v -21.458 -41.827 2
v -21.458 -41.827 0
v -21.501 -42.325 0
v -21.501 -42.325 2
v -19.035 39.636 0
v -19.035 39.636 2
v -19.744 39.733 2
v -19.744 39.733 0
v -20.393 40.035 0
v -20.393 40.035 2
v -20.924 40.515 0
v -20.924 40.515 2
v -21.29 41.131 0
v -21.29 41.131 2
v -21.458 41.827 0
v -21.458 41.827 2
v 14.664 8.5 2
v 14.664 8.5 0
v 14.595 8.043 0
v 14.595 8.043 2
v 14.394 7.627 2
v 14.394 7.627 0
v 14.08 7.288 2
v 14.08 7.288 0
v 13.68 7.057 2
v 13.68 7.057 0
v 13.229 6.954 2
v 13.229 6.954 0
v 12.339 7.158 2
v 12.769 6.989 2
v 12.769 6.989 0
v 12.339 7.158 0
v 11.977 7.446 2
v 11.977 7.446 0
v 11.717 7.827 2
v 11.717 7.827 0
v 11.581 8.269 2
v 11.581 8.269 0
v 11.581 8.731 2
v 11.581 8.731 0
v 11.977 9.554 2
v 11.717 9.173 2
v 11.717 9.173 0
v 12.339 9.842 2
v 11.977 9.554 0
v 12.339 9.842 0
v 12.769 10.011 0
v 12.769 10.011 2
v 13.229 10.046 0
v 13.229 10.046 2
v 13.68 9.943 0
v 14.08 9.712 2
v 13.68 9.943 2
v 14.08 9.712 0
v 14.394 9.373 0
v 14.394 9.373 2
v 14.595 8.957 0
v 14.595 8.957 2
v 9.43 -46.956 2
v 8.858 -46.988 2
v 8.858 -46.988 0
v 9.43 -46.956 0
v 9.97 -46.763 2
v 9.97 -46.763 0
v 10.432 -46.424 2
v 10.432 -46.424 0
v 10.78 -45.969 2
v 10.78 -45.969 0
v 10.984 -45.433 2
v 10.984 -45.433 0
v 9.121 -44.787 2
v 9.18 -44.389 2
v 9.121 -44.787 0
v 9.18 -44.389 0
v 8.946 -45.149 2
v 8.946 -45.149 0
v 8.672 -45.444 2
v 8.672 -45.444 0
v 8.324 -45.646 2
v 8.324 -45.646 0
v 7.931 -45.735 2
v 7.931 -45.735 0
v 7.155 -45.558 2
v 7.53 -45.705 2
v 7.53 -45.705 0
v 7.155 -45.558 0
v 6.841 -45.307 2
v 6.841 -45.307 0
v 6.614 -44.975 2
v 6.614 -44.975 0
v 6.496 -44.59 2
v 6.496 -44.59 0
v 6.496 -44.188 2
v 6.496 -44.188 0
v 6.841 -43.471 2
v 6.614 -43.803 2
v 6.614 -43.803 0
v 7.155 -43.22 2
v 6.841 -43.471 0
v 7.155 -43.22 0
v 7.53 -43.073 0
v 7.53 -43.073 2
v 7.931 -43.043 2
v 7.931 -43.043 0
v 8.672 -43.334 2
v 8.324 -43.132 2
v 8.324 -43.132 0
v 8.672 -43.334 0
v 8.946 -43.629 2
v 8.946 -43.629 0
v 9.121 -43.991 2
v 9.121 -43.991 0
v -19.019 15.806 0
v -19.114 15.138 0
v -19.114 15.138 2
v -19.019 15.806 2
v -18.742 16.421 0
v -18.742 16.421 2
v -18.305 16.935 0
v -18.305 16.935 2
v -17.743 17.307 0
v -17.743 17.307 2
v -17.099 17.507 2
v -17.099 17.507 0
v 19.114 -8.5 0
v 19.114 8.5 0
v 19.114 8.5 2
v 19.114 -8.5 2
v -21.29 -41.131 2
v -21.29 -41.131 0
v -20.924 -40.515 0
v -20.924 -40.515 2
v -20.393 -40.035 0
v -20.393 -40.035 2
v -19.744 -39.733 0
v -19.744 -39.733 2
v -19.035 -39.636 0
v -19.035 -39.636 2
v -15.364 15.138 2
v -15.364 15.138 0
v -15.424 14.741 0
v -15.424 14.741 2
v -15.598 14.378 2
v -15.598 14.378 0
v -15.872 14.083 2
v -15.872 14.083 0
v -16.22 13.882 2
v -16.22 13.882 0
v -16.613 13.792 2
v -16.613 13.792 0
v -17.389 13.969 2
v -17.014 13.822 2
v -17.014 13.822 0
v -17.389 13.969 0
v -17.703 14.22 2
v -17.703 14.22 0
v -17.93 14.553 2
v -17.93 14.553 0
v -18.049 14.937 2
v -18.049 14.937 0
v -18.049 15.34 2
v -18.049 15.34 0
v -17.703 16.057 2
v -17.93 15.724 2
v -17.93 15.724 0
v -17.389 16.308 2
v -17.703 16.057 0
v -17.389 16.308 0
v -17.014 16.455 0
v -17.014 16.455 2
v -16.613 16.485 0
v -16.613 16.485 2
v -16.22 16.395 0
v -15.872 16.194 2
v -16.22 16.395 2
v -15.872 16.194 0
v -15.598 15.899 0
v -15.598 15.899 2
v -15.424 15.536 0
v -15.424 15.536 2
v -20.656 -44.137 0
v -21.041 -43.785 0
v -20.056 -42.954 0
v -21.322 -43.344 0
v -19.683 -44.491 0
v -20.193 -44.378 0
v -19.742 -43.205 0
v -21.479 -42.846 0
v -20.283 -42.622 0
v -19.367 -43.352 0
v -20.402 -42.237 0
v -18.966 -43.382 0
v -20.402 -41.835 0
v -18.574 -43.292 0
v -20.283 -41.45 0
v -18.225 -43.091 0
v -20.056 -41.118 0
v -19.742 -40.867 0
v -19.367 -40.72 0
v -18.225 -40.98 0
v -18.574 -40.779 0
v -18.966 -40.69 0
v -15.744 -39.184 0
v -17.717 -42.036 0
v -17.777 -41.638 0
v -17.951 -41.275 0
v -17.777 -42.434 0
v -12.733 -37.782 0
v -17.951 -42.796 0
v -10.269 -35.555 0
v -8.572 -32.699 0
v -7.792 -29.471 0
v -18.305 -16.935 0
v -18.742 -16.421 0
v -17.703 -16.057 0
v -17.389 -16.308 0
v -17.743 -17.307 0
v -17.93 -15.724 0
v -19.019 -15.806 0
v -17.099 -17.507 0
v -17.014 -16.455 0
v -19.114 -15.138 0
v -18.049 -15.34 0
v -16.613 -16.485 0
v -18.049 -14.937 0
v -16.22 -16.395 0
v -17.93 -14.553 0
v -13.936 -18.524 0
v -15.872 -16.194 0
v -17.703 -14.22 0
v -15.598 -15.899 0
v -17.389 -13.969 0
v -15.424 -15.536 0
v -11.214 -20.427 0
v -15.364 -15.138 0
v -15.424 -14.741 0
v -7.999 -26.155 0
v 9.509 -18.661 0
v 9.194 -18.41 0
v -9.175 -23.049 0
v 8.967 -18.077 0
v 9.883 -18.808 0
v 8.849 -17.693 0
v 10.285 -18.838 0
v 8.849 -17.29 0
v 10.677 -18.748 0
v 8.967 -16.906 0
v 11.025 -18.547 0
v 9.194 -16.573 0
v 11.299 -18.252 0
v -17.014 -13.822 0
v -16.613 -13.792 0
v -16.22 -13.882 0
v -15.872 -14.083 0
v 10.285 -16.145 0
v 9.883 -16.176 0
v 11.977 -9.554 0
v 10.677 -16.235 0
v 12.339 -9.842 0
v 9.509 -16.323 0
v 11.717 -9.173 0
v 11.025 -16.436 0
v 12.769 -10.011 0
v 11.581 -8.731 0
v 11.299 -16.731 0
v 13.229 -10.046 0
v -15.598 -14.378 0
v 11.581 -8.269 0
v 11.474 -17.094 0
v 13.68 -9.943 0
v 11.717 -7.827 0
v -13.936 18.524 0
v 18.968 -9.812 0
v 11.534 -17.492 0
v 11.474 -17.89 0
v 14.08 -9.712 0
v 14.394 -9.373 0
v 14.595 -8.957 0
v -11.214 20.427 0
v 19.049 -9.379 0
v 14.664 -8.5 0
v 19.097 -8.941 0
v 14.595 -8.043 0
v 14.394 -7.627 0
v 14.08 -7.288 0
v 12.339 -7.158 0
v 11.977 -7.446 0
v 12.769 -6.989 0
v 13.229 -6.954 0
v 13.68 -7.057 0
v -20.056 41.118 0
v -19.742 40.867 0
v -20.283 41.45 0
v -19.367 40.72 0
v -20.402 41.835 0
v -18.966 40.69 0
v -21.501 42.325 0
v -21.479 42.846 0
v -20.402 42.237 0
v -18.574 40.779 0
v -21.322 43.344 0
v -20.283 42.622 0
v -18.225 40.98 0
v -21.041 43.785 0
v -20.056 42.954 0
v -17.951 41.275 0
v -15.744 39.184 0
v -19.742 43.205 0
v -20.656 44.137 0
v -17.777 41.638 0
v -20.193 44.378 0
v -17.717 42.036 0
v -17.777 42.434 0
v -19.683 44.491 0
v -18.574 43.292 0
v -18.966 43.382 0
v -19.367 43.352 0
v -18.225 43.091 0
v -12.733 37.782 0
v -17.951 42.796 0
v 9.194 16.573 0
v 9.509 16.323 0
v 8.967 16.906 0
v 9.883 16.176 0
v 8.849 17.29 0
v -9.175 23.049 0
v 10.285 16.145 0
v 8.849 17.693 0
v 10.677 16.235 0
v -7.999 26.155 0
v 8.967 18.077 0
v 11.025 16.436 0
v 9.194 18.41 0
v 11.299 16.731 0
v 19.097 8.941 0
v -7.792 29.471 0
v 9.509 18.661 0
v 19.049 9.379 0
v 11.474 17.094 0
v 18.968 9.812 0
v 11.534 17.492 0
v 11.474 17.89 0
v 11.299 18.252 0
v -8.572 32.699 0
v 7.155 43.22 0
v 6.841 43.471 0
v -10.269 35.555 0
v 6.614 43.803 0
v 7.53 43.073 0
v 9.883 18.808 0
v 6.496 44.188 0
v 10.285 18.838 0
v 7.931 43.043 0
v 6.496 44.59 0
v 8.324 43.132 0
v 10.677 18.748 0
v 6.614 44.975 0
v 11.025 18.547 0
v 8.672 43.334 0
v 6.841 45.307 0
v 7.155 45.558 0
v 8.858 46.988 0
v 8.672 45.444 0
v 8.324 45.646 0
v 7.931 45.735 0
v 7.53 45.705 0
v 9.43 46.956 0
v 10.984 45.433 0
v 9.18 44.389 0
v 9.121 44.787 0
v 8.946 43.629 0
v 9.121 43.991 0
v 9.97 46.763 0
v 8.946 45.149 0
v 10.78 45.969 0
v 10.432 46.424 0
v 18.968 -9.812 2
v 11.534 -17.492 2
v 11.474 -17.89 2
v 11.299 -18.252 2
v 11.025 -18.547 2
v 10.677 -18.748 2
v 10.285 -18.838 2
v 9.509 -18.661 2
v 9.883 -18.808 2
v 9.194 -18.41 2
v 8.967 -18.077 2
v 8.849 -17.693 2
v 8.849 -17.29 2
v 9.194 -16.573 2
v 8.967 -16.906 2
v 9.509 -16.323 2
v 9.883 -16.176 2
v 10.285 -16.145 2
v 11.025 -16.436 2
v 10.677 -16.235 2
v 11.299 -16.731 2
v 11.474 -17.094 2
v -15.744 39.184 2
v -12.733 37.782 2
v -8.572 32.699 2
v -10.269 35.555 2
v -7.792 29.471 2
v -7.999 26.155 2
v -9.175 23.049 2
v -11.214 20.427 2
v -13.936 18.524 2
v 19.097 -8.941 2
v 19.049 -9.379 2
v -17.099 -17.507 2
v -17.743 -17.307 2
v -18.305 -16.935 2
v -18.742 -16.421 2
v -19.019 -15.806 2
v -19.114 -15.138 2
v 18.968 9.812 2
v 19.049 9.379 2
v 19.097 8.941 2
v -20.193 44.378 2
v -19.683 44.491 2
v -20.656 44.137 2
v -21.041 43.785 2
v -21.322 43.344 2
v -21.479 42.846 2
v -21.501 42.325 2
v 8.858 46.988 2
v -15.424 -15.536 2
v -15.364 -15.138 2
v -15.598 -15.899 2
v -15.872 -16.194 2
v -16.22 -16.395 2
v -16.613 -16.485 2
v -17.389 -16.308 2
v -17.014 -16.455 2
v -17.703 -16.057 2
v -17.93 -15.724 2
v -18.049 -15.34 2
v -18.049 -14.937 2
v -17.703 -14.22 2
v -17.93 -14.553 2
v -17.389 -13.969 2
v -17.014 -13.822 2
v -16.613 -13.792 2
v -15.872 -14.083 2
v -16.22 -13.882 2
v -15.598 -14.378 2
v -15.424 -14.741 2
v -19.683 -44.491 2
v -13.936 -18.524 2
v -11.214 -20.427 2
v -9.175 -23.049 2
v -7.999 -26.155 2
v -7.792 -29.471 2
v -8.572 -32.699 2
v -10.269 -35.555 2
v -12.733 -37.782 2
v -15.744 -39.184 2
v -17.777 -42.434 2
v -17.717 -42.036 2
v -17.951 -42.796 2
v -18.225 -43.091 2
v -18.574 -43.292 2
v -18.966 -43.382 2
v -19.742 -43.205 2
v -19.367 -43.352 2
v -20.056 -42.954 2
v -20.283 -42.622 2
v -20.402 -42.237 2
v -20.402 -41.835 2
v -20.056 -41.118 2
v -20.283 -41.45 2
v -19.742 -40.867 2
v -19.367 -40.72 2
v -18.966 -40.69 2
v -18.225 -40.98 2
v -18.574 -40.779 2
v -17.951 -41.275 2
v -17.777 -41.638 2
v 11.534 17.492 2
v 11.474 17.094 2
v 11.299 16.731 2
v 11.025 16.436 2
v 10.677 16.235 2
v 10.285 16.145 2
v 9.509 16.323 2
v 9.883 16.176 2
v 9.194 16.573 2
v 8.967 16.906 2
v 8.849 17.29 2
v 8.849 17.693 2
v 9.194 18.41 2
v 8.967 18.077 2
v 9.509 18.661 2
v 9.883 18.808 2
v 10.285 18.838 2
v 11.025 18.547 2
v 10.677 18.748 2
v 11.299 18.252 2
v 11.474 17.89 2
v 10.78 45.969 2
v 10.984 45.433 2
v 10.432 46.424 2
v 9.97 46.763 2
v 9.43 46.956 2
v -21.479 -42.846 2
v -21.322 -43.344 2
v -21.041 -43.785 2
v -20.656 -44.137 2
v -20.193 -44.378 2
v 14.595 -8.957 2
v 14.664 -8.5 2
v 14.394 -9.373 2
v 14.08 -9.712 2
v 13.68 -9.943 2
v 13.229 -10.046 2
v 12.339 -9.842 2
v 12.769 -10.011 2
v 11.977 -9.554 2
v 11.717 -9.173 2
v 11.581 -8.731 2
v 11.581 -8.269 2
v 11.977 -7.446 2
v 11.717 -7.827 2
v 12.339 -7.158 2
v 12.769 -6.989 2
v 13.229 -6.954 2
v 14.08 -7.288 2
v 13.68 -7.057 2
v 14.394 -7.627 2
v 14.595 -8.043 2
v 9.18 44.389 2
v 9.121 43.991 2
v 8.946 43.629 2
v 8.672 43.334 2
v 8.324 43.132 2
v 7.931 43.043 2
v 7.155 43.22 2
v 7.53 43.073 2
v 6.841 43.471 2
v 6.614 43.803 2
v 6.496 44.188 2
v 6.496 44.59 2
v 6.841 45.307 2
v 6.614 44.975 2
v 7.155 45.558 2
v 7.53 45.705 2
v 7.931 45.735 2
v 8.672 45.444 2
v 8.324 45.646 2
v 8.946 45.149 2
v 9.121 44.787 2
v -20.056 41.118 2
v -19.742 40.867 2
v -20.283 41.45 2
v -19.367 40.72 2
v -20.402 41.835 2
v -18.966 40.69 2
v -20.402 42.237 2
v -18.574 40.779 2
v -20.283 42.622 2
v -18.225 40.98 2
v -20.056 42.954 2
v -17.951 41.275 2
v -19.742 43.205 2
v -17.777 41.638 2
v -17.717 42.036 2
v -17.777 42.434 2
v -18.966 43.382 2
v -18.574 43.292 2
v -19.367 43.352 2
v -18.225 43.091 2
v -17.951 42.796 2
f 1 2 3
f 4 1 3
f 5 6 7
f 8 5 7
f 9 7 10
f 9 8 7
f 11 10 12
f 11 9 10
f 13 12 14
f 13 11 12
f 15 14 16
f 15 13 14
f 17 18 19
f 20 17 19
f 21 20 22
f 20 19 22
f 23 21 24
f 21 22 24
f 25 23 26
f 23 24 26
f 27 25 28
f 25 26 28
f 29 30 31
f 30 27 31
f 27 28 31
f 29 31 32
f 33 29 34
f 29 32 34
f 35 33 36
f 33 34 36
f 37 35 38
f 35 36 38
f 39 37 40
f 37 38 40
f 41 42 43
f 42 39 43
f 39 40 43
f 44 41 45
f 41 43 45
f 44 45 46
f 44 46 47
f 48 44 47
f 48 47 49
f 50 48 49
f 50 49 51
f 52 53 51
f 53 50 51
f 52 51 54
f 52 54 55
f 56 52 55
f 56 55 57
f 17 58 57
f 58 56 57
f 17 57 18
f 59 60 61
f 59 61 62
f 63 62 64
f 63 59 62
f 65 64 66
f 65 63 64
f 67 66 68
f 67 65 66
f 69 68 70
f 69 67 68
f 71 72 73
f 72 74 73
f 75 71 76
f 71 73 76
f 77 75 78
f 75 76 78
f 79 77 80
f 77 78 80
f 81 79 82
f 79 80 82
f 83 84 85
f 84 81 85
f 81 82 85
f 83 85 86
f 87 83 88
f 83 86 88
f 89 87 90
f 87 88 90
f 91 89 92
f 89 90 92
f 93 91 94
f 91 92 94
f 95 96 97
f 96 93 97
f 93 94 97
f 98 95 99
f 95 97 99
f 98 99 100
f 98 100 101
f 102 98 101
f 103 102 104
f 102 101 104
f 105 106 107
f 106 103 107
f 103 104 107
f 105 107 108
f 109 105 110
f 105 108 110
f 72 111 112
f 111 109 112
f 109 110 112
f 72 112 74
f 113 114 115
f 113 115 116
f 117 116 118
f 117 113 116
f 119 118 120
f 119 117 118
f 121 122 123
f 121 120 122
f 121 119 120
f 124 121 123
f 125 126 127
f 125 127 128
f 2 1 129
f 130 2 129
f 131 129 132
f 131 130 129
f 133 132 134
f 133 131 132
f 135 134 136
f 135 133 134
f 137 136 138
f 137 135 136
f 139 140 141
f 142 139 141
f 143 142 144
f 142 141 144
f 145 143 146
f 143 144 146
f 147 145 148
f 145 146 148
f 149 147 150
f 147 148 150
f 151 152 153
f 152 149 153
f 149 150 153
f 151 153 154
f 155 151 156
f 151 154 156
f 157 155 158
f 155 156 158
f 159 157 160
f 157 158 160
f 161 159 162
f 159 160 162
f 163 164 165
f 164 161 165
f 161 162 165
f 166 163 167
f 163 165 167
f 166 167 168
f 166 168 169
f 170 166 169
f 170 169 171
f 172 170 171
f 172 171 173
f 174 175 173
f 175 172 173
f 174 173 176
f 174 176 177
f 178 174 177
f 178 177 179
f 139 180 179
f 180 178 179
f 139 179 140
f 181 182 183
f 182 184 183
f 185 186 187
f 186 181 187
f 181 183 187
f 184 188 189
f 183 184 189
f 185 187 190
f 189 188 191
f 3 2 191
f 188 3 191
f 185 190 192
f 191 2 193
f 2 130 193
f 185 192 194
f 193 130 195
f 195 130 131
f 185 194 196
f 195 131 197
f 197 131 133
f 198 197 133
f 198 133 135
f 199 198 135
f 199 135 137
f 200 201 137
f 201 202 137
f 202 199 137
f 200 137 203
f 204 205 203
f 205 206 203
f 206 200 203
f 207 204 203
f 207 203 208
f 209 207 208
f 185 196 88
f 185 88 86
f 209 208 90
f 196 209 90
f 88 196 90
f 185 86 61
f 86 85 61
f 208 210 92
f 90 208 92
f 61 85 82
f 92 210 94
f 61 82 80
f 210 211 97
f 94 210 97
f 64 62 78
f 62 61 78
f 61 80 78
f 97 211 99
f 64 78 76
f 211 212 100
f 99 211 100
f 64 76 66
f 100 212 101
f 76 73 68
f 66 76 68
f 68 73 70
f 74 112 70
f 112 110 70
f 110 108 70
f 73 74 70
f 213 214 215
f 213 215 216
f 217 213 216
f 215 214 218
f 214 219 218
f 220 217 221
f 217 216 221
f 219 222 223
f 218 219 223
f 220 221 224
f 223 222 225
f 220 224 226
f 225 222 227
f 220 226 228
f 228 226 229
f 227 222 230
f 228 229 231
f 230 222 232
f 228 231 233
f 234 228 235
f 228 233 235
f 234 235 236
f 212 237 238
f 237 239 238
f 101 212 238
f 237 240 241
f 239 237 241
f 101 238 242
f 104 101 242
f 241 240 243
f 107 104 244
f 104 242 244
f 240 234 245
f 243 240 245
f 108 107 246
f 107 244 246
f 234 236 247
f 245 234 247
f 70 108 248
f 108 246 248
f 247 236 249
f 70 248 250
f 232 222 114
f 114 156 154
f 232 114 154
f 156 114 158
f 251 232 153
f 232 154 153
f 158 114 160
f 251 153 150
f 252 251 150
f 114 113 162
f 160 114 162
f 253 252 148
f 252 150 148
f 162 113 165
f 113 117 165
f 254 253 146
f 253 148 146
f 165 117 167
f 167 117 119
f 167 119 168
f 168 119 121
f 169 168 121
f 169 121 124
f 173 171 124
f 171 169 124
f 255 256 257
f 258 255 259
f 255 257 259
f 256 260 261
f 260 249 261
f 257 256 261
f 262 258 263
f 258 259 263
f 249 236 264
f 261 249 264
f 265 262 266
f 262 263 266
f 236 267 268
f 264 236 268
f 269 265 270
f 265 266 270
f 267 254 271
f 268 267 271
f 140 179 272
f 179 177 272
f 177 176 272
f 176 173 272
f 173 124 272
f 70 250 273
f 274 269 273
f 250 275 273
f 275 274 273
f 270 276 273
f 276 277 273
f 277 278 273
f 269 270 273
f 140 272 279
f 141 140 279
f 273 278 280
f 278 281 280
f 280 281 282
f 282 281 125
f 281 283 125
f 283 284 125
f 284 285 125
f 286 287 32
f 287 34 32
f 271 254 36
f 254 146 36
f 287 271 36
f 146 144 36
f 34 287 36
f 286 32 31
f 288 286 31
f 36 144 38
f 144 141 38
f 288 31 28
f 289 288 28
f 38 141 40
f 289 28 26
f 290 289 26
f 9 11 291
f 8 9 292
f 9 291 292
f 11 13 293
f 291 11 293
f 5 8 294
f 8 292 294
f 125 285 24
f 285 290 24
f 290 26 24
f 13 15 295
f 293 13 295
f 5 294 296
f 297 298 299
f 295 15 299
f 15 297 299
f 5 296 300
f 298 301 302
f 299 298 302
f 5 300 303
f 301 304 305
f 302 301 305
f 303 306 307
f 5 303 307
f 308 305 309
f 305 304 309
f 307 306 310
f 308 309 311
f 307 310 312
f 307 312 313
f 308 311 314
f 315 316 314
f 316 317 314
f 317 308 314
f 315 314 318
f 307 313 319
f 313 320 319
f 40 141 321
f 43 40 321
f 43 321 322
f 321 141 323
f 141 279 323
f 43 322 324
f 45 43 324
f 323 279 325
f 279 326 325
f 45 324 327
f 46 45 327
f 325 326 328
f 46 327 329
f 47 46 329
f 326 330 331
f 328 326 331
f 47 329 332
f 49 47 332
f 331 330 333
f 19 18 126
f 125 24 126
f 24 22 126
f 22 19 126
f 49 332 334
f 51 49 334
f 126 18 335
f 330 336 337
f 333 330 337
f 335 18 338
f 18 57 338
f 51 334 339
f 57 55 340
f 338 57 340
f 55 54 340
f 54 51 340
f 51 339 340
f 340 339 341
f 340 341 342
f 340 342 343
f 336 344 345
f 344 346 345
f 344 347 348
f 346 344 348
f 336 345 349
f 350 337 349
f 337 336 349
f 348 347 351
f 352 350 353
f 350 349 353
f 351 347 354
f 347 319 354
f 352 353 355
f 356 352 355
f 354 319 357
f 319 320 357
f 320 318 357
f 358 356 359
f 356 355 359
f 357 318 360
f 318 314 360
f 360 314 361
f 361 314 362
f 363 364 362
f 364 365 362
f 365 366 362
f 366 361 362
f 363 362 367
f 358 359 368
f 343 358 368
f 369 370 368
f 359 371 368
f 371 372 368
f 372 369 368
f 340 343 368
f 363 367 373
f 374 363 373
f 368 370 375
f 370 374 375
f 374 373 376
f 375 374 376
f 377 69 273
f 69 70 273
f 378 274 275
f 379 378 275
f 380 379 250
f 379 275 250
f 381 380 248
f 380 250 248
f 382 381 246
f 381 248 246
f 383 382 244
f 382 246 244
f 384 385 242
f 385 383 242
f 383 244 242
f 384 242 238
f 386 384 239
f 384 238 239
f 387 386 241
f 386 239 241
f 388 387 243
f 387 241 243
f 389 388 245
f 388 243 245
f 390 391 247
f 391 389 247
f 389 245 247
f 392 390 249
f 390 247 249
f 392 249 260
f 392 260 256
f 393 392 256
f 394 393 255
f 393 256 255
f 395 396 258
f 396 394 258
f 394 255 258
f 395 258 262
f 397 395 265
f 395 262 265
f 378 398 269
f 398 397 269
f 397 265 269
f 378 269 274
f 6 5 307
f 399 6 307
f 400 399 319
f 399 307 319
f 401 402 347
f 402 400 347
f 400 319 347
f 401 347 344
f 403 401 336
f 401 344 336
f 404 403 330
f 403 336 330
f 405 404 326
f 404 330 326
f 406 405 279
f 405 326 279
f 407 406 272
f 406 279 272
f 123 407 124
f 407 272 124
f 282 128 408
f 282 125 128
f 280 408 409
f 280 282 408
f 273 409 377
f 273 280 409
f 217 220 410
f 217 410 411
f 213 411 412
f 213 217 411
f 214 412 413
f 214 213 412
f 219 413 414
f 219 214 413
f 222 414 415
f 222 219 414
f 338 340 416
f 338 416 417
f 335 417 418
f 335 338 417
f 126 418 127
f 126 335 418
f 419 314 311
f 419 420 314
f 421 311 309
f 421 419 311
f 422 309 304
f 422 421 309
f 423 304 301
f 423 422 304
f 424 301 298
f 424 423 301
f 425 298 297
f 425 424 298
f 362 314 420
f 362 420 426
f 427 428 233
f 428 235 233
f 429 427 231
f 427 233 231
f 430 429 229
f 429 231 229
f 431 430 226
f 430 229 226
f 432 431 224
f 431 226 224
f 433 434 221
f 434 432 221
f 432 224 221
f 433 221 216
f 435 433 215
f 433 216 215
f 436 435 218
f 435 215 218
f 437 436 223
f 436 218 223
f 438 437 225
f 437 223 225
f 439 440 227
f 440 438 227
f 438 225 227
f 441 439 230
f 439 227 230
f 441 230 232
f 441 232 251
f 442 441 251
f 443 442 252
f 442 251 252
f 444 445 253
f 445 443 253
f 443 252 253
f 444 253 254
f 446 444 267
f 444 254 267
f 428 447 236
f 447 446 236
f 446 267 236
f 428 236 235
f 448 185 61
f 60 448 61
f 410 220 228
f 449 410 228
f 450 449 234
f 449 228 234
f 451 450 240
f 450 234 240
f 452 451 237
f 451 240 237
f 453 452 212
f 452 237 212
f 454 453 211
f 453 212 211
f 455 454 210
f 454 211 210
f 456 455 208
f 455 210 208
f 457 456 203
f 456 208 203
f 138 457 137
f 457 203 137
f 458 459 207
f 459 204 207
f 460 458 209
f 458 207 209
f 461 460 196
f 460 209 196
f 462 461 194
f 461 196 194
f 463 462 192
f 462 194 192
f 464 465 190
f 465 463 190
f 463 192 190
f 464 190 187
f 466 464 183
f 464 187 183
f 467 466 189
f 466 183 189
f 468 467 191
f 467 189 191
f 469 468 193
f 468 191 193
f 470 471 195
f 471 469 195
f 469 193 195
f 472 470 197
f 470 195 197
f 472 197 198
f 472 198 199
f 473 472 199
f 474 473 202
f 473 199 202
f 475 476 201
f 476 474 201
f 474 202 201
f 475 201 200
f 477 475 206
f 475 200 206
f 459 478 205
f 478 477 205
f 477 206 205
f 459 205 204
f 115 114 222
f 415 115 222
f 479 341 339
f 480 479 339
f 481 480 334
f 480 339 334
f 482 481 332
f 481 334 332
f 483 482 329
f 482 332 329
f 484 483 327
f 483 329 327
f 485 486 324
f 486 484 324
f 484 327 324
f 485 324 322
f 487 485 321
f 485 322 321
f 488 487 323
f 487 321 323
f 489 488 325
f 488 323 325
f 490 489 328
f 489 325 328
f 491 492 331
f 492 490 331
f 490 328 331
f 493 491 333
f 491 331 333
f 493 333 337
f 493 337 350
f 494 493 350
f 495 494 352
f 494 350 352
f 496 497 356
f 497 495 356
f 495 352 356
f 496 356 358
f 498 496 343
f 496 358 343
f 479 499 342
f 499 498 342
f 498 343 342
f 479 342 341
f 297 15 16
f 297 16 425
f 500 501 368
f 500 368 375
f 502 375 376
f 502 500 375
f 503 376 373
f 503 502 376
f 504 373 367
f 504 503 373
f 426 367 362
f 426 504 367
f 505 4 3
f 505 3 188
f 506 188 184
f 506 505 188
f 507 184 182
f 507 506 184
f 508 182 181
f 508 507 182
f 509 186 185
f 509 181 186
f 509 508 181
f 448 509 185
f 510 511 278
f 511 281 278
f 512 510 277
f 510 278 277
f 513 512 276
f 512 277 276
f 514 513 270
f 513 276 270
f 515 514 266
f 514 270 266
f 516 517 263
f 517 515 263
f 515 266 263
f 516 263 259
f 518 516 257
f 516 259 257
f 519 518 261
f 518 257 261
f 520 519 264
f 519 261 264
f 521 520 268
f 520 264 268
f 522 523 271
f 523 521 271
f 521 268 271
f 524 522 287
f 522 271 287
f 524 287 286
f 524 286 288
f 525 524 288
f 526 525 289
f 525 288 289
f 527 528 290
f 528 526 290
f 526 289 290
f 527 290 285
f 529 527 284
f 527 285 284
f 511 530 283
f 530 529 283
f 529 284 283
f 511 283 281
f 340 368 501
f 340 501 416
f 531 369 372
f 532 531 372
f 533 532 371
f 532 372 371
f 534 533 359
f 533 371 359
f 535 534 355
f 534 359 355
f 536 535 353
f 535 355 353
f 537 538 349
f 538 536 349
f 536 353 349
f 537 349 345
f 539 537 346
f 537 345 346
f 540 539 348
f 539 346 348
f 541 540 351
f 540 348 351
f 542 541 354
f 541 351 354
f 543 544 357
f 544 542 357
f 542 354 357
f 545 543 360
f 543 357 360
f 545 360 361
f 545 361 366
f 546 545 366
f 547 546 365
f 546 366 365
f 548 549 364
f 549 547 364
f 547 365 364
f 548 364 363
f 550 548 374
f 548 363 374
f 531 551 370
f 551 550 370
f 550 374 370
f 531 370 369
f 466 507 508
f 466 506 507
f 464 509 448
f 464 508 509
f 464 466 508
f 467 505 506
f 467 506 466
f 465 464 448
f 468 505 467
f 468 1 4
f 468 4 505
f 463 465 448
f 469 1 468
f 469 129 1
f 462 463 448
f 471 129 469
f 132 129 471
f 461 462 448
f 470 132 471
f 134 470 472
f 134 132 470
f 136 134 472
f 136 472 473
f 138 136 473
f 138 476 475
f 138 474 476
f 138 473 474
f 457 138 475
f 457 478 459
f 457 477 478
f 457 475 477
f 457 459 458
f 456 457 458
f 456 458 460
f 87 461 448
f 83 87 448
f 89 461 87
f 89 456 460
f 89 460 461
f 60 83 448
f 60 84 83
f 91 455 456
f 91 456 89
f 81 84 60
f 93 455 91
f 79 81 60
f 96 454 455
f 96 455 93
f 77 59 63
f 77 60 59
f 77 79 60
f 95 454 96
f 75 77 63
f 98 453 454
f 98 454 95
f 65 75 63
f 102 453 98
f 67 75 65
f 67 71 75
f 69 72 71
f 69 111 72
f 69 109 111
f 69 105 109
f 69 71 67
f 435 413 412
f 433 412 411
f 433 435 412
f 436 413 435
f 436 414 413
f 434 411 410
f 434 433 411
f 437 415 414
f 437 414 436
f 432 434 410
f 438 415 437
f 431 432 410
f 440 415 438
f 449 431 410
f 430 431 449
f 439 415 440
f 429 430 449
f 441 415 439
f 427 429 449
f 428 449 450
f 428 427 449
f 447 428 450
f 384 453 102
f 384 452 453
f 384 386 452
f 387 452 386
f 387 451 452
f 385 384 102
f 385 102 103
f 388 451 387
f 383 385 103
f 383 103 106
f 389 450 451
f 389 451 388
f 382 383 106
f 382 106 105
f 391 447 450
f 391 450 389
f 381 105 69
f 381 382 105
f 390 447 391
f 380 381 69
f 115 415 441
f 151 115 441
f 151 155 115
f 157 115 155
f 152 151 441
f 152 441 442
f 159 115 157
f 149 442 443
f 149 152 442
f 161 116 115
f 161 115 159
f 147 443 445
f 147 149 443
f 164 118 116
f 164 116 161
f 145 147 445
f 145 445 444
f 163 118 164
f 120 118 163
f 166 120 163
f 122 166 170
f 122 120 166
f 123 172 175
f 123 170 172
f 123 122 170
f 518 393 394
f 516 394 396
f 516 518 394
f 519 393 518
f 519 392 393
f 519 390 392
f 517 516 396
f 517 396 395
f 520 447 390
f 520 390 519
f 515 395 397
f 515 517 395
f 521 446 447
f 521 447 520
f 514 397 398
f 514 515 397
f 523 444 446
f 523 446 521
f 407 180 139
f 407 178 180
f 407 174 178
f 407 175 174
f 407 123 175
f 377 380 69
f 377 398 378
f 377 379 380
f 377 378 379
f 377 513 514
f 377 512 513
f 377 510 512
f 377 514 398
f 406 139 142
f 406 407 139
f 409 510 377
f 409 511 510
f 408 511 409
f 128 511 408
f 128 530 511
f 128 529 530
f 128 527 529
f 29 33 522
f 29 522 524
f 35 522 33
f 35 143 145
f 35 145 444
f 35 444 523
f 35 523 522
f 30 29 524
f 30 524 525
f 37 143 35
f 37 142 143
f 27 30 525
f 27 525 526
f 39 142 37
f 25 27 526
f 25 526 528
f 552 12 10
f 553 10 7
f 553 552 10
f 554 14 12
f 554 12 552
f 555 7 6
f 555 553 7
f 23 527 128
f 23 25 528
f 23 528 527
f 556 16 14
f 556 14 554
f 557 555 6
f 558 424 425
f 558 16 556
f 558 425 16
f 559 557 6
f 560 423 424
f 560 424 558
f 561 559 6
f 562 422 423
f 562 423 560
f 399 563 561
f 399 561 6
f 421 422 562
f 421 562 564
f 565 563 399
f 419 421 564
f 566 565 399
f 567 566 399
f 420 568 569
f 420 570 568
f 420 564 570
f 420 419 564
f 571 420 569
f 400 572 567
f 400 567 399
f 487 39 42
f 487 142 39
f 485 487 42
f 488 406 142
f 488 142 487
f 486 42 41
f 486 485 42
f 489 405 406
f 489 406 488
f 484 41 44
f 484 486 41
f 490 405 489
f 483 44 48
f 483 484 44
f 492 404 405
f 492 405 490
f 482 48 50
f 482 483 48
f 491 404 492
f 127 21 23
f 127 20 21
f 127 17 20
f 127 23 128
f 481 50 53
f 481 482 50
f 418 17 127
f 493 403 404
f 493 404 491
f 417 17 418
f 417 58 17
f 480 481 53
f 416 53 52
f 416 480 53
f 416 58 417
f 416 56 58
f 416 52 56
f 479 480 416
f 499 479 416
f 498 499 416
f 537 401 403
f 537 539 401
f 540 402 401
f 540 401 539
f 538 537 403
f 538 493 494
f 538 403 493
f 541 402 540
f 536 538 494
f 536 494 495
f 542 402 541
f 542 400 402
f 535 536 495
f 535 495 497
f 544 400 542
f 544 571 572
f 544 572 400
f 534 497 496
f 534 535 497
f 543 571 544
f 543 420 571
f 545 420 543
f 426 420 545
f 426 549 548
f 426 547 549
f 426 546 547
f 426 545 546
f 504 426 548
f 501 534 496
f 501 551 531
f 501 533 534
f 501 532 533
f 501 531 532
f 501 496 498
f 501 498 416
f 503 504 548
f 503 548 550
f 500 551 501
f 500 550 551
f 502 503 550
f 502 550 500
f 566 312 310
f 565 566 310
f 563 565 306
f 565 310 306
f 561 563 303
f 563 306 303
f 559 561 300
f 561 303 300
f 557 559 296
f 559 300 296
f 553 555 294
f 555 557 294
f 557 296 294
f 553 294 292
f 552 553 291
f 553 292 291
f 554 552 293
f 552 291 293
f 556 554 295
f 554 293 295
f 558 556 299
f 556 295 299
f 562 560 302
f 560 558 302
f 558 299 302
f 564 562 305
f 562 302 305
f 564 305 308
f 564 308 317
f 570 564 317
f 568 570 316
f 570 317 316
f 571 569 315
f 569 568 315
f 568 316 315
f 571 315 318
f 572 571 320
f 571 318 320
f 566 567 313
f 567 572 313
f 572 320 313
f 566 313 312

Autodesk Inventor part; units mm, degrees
ref_plane "YZ Plane" through (0, 0, 0) normal (1, 0, 0) x (0, 1, 0)
ref_plane "XZ Plane" through (0, 0, 0) normal (0, 1, 0) x (-1, 0, 0)
ref_plane "XY Plane" through (0, 0, 0) normal (0, 0, 1) x (1, 0, 0)
sketch "スケッチ1" plane through (0, 0, 0) normal (0, 0, 1) x (1, 0, 0)
  line L0 (-32.2352, 43.3932) -> (10.6011, 47.1409) construction
  line L1 (10.6011, 47.1409) -> (13.3901, 15.2627) construction
  line L2 (13.3901, 15.2627) -> (-29.4462, 11.515) construction
  line L3 (-29.4462, 11.515) -> (-32.2352, 43.3932) construction
  line L4 (-32.2352, 43.3932) -> (13.3901, 15.2627) construction
  line L5 (10.6011, 47.1409) -> (-29.4462, 11.515) construction
  line L6 (-30.8407, 27.4541) -> (11.9956, 31.2018) construction
  line L7 (7.8305, 44.389) -> (-19.0668, 42.0358) construction
  line L8 (-19.0668, 42.0358) -> (-16.7136, 15.1385) construction
  line L9 (-16.7136, 15.1385) -> (10.1837, 17.4917) construction
  line L10 (10.1837, 17.4917) -> (7.8305, 44.389) construction
  line L11 (7.8305, 44.389) -> (-16.7136, 15.1385) construction
  line L12 (-19.0668, 42.0358) -> (10.1837, 17.4917) construction
  circle A0 centre (-18.8864, 28.5) radius 10.5 construction
  circle A1 centre (-19.0668, 42.0358) radius 1.35
  line L13 (-5.6182, 43.2124) -> (-3.265, 16.3151) construction
  circle A2 centre (7.8305, 44.389) radius 1.35
  circle A3 centre (-16.7136, 15.1385) radius 1.35
  circle A4 centre (10.1837, 17.4917) radius 1.35
  arc A5 (-21.4577, 41.8266) -> (-19.0348, 39.636) centre (-19.0668, 42.0358) ccw
  arc A6 (-17.0988, 17.5074) -> (-19.0348, 39.636) centre (-18.8864, 28.5) ccw
  arc A7 (-17.0988, 17.5074) -> (-19.1136, 15.1385) centre (-16.7136, 15.1385) ccw
  line L14 (-21.4577, 41.8266) -> (-21.6756, 44.3171)
  circle A8 centre (13.1136, 8.5) radius 1.55
  circle A9 centre (13.1136, 8.5) radius 6 construction
  circle A10 centre (13.1136, 8.5) radius 4.6 construction
  line L15 (19.1136, 8.5) -> (19.1136, -8.5)
  line L16 (-19.1136, 15.1385) -> (-19.1136, -15.1385)
  line L17 (-19.1136, 0) -> (19.1136, 0) construction
  line L18 (-21.6756, 44.3171) -> (10.6011, 47.1409)
  line L19 (10.6011, 47.1409) -> (18.9683, 9.8123)
  arc A11 (19.1136, 8.5) -> (18.9683, 9.8123) centre (13.1136, 8.5) ccw
  circle A12 centre (-18.8864, -28.5) radius 10.5 construction
  circle A13 centre (-19.0668, -42.0358) radius 1.35
  circle A14 centre (7.8305, -44.389) radius 1.35
  circle A15 centre (-16.7136, -15.1385) radius 1.35
  circle A16 centre (10.1837, -17.4917) radius 1.35
  arc A17 (-19.0348, -39.636) -> (-21.4577, -41.8266) centre (-19.0668, -42.0358) ccw
  arc A18 (-19.0348, -39.636) -> (-17.0988, -17.5074) centre (-18.8864, -28.5) ccw
  arc A19 (-19.1136, -15.1385) -> (-17.0988, -17.5074) centre (-16.7136, -15.1385) ccw
  line L20 (-21.4577, -41.8266) -> (-21.6756, -44.3171)
  circle A20 centre (13.1136, -8.5) radius 1.55
  circle A21 centre (13.1136, -8.5) radius 6 construction
  line L21 (-21.6756, -44.3171) -> (10.6011, -47.1409)
  line L22 (10.6011, -47.1409) -> (18.9683, -9.8123)
  arc A22 (18.9683, -9.8123) -> (19.1136, -8.5) centre (13.1136, -8.5) ccw
  point P0 (0, 0)
  point P1 (-9.4225, 29.328)
  point P2 (-4.4416, 29.7638)
  dimension "d21" = 43
  dimension "d22" = 32
  dimension "d23" = 27
  dimension "d24" = 27
  dimension "d27" = 21
  dimension "d28" = 9.5
  dimension "d29" = 2.7
  dimension "d30" = 2.4
  dimension "d31" = 3.1
  dimension "d34" = 12
  dimension "d39" = 8.5
  dimension "d40" = 9.2
  dimension "d41" = 32
  dimension "d43" = 5
  dimension "d45" = 17
  dimension "d46" = 20
  dimension "d47" = 57
extrude "押し出し1" add sketch "スケッチ1" along normal blind 2
fillet "フィレット1" radius 2 4 edges at (-21.6756, 44.3171, 1) (-21.6756, -44.3171, 1) (10.6011, -47.1409, 1) (10.6011, 47.1409, 1)
properties part number "膝_メインフレーム_1" material "アルミニウム 2014-T4"
